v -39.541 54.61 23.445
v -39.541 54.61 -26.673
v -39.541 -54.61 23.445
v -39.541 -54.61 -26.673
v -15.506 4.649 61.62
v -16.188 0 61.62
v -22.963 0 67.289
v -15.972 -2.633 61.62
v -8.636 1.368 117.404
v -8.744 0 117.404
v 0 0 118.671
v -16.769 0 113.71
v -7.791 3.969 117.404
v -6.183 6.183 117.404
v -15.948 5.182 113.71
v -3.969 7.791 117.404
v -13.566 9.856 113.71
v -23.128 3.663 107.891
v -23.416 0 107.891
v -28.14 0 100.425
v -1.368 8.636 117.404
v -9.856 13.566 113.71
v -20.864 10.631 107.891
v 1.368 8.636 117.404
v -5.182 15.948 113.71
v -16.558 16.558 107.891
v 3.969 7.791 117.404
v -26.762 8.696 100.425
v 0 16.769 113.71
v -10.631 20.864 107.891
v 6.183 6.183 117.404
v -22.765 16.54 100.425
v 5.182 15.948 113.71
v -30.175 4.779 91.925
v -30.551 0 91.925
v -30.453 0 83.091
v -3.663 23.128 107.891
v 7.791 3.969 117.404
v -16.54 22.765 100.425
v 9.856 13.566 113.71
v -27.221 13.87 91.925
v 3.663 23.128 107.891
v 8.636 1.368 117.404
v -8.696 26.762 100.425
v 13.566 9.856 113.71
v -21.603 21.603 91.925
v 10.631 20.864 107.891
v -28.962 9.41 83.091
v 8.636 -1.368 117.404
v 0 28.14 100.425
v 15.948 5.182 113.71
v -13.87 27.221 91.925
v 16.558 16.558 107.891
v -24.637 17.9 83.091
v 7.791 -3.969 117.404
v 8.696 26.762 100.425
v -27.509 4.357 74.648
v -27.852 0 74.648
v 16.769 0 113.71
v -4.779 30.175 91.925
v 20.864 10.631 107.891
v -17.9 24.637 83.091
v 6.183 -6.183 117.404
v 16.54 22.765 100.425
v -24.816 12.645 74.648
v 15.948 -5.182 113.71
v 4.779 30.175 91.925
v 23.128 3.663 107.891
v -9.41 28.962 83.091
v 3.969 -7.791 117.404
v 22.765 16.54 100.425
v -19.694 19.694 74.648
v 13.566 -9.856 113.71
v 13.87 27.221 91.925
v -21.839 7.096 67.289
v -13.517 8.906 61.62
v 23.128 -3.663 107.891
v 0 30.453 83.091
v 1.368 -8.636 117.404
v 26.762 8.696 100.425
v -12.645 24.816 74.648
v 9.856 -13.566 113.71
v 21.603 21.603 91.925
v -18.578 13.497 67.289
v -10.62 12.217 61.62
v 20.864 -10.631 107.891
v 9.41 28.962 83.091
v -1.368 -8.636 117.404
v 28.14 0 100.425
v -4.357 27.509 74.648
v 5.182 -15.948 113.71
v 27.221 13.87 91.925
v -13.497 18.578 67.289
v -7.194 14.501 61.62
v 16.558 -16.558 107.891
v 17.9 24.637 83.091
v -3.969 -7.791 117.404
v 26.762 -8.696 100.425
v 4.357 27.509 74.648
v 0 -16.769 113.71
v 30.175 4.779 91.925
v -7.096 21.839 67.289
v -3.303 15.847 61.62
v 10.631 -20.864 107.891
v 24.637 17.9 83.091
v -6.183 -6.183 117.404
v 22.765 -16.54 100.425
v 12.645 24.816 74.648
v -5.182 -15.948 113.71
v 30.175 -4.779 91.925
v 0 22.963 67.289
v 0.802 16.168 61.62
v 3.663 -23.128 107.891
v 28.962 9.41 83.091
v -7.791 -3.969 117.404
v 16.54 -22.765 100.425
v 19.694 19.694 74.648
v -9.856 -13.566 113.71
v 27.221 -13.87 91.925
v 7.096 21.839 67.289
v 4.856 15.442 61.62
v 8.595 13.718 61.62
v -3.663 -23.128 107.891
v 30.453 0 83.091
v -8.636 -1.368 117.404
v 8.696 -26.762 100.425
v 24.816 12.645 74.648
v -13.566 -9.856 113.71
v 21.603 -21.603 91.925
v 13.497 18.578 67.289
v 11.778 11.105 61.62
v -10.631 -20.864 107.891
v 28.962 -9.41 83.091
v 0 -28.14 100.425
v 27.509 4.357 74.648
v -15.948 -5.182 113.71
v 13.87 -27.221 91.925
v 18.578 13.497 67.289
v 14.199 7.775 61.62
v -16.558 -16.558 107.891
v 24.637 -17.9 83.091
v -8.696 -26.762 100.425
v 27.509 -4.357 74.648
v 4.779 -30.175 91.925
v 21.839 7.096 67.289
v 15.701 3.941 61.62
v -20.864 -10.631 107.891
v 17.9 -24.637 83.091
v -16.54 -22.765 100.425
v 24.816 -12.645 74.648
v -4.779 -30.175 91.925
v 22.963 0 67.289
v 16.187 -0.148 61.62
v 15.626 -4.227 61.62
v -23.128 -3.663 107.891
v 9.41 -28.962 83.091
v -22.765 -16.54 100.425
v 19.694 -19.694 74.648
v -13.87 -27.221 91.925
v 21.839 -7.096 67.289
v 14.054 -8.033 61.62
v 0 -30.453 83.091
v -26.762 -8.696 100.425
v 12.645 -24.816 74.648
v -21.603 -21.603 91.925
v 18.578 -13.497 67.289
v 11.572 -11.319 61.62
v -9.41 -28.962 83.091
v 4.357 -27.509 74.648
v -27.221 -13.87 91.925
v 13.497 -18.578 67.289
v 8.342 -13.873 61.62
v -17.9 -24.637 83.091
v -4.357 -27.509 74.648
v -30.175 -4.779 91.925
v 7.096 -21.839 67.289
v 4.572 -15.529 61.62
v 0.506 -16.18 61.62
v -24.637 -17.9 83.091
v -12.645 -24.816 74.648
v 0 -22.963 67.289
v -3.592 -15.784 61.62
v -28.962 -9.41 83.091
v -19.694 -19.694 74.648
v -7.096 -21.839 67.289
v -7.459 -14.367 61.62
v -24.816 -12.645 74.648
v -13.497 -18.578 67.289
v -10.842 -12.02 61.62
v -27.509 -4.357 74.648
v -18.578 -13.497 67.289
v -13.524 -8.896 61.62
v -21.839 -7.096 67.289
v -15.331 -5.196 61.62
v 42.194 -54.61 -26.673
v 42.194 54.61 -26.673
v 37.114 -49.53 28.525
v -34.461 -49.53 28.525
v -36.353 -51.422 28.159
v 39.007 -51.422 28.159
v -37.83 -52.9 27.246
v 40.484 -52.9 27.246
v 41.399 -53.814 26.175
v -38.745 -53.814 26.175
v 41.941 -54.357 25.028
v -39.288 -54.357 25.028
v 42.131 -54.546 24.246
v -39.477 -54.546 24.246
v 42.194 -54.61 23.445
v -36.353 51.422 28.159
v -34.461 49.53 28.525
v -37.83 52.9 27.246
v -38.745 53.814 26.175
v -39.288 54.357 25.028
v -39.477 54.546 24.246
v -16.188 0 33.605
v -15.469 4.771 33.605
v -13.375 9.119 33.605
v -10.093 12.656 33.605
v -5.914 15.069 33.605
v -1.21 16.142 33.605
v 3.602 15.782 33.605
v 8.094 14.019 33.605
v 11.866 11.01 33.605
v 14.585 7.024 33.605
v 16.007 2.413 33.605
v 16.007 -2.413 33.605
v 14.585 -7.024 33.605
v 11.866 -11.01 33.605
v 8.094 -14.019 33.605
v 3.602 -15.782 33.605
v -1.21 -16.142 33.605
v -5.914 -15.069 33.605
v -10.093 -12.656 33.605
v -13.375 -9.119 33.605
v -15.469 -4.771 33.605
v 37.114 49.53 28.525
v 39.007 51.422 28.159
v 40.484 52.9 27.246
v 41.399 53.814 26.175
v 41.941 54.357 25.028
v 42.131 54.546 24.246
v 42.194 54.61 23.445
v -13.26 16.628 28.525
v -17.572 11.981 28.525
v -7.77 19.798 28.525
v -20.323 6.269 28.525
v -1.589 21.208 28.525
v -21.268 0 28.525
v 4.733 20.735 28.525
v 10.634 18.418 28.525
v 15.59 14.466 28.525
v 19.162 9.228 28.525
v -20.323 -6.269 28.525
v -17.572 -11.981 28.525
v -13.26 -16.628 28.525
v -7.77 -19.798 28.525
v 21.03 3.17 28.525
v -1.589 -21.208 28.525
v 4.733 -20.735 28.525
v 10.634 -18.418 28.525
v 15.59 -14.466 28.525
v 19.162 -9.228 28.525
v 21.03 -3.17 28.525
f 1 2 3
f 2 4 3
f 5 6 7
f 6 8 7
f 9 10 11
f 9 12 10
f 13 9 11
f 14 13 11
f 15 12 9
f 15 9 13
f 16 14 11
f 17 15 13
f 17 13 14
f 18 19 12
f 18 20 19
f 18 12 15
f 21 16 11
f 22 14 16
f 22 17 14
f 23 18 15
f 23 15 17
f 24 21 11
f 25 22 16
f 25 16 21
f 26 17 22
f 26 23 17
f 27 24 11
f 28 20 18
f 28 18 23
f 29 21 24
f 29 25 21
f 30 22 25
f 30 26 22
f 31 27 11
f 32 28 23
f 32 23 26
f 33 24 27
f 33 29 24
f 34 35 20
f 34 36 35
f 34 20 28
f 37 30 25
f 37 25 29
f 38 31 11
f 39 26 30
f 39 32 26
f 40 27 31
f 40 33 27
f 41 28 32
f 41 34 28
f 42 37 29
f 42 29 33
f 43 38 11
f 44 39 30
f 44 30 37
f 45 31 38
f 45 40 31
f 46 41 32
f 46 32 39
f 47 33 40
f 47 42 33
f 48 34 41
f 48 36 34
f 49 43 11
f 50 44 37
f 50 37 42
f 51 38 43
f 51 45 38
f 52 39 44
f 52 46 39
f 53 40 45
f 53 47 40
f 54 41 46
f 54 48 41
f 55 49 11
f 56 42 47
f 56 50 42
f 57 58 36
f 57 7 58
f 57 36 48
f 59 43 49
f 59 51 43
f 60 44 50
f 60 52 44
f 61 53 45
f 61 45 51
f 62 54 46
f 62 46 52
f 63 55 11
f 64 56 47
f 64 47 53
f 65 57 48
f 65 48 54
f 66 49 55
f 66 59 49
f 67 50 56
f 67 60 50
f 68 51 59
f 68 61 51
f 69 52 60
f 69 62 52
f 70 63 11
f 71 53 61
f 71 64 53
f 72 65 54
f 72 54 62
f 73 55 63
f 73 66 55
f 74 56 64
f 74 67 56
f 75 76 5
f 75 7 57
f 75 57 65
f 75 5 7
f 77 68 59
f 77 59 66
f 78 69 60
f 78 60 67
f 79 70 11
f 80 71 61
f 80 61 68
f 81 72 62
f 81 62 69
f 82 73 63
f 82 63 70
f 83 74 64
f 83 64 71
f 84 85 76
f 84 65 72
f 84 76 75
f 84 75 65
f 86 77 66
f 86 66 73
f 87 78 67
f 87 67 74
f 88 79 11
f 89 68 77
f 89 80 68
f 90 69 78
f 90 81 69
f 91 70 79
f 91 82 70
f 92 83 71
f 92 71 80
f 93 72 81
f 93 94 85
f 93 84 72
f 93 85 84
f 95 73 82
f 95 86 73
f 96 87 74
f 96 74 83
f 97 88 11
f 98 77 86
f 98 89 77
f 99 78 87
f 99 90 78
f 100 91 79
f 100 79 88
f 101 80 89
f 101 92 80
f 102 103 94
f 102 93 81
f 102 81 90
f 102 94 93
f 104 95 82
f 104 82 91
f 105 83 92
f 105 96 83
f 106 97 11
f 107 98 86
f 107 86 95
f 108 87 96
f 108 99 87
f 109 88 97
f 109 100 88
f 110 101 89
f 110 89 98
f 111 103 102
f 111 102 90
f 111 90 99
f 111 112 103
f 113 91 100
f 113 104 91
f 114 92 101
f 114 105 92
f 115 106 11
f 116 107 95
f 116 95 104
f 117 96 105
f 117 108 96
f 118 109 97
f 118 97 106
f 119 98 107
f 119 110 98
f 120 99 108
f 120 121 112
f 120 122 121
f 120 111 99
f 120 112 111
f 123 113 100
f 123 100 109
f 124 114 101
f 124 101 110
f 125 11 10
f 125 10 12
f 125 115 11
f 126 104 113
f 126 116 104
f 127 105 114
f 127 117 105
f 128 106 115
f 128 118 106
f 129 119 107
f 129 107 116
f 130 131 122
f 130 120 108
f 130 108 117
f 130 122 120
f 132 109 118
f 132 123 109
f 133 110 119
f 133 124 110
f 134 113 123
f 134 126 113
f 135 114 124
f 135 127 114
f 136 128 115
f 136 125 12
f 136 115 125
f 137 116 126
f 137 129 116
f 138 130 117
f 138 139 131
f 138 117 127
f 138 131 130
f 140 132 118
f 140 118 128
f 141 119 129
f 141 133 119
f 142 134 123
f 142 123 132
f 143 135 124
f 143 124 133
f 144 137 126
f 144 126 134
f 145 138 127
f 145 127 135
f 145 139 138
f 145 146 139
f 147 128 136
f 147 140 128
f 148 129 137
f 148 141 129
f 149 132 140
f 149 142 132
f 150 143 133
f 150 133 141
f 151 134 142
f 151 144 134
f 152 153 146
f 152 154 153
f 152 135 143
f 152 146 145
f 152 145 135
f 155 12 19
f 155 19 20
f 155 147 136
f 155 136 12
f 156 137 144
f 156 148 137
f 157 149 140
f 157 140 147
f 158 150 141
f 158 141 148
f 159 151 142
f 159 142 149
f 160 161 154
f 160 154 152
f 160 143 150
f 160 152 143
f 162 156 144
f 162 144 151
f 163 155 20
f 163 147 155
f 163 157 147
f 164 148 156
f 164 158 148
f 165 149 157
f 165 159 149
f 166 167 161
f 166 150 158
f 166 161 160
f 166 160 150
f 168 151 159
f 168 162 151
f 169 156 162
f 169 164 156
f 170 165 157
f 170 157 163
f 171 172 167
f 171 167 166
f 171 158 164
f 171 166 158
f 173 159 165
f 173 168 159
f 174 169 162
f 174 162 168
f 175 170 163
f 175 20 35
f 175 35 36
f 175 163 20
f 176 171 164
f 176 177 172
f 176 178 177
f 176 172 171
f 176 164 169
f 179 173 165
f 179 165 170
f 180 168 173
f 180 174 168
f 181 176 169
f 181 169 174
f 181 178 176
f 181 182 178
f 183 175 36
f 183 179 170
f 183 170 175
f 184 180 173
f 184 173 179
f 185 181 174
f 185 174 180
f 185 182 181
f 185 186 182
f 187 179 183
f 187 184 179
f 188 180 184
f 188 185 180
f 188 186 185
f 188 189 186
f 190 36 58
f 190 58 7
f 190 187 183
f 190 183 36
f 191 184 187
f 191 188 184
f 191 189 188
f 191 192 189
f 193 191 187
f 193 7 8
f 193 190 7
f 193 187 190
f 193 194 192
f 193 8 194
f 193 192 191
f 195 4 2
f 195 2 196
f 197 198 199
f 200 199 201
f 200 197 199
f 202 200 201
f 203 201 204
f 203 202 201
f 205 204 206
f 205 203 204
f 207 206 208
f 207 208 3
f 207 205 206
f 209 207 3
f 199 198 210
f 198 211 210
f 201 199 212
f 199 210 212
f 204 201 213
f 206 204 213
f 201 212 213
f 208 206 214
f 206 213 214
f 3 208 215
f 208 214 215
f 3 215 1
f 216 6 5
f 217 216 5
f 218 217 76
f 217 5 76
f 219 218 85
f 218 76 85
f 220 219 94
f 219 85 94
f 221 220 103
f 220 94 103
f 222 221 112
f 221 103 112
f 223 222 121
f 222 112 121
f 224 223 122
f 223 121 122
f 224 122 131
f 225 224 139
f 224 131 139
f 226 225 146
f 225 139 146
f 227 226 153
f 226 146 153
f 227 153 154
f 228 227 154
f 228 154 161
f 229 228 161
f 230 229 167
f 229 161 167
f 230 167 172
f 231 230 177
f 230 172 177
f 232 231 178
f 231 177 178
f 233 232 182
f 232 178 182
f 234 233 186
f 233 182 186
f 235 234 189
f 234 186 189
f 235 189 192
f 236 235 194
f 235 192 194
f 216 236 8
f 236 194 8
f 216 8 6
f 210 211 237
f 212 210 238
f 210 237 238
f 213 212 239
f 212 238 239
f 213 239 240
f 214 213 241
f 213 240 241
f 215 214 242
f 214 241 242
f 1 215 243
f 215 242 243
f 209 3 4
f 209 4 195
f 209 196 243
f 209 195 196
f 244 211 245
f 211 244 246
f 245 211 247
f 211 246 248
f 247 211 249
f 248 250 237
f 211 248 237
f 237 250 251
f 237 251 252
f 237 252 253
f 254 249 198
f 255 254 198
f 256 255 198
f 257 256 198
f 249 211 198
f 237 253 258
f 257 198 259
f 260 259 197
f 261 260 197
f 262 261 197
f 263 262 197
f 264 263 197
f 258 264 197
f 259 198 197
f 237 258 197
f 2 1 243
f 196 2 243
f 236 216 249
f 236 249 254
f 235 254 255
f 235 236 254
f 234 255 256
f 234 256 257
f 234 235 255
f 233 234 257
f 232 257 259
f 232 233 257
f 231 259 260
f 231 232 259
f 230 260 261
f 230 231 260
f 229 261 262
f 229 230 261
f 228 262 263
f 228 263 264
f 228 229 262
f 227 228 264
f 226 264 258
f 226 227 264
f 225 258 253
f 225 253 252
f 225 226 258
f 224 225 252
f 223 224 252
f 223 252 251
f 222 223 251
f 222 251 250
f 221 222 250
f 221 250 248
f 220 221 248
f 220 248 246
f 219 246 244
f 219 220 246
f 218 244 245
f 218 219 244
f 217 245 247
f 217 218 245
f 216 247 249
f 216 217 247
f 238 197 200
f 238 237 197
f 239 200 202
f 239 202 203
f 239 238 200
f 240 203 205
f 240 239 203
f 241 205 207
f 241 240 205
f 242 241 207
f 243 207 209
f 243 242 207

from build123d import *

# Parameters (mm, degrees)
F0_W     = 81.7349255085
F0_H     = 55.1976133138
F1_DEPTH = 54.61
F2_W     = 16.1877609789
F2_H     = 56.2591040507
F6_R     = 5.08
F7_SIZE  = 5.08


with BuildPart() as f1:
    # F0 (on Front) → F1 (new body, symmetric)
    with BuildSketch(Plane.XZ):
        with Locations((1.3268664479, 0.9260410443)):
            Rectangle(F0_W, F0_H)
    extrude(amount=F1_DEPTH, both=True)

    # F2 (on Front) → F3 (revolve)
    with BuildSketch(Plane.XZ):
        with Locations((-8.0938804895, 41.5281313471)):
            Rectangle(F2_W, F2_H)
    revolve(axis=Axis((0, 0, 41.5281313471), (0, 0, -1)))

    # F4 (on Front) → F5 (revolve)
    with BuildSketch(Plane.XZ):
        with BuildLine():
            Line((0, 57.0264922878), (0, 118.6706257561))
            ThreePointArc((0, 118.6706257561), (-30.8220667341, 87.8485590219), (0, 57.0264922878))
        make_face()
    revolve(axis=Axis((0, 0, 87.8485590219), (0, 0, -1)))

    # F6
    f6_edges = [f1.edges().sort_by_distance(p)[0] for p in [
        (1.326866, -54.61, 28.524848),
        (42.194329, 0, 28.524848),
        (1.326866, 54.61, 28.524848),
        (-39.540596, 0, 28.524848),
    ]]
    fillet(f6_edges, radius=F6_R)

    # F7
    f7_edges = [f1.edges().sort_by_distance(p)[0] for p in [
        (16.187761, 0, 28.524848),
    ]]
    chamfer(f7_edges, length=F7_SIZE)


solid = f1.part
